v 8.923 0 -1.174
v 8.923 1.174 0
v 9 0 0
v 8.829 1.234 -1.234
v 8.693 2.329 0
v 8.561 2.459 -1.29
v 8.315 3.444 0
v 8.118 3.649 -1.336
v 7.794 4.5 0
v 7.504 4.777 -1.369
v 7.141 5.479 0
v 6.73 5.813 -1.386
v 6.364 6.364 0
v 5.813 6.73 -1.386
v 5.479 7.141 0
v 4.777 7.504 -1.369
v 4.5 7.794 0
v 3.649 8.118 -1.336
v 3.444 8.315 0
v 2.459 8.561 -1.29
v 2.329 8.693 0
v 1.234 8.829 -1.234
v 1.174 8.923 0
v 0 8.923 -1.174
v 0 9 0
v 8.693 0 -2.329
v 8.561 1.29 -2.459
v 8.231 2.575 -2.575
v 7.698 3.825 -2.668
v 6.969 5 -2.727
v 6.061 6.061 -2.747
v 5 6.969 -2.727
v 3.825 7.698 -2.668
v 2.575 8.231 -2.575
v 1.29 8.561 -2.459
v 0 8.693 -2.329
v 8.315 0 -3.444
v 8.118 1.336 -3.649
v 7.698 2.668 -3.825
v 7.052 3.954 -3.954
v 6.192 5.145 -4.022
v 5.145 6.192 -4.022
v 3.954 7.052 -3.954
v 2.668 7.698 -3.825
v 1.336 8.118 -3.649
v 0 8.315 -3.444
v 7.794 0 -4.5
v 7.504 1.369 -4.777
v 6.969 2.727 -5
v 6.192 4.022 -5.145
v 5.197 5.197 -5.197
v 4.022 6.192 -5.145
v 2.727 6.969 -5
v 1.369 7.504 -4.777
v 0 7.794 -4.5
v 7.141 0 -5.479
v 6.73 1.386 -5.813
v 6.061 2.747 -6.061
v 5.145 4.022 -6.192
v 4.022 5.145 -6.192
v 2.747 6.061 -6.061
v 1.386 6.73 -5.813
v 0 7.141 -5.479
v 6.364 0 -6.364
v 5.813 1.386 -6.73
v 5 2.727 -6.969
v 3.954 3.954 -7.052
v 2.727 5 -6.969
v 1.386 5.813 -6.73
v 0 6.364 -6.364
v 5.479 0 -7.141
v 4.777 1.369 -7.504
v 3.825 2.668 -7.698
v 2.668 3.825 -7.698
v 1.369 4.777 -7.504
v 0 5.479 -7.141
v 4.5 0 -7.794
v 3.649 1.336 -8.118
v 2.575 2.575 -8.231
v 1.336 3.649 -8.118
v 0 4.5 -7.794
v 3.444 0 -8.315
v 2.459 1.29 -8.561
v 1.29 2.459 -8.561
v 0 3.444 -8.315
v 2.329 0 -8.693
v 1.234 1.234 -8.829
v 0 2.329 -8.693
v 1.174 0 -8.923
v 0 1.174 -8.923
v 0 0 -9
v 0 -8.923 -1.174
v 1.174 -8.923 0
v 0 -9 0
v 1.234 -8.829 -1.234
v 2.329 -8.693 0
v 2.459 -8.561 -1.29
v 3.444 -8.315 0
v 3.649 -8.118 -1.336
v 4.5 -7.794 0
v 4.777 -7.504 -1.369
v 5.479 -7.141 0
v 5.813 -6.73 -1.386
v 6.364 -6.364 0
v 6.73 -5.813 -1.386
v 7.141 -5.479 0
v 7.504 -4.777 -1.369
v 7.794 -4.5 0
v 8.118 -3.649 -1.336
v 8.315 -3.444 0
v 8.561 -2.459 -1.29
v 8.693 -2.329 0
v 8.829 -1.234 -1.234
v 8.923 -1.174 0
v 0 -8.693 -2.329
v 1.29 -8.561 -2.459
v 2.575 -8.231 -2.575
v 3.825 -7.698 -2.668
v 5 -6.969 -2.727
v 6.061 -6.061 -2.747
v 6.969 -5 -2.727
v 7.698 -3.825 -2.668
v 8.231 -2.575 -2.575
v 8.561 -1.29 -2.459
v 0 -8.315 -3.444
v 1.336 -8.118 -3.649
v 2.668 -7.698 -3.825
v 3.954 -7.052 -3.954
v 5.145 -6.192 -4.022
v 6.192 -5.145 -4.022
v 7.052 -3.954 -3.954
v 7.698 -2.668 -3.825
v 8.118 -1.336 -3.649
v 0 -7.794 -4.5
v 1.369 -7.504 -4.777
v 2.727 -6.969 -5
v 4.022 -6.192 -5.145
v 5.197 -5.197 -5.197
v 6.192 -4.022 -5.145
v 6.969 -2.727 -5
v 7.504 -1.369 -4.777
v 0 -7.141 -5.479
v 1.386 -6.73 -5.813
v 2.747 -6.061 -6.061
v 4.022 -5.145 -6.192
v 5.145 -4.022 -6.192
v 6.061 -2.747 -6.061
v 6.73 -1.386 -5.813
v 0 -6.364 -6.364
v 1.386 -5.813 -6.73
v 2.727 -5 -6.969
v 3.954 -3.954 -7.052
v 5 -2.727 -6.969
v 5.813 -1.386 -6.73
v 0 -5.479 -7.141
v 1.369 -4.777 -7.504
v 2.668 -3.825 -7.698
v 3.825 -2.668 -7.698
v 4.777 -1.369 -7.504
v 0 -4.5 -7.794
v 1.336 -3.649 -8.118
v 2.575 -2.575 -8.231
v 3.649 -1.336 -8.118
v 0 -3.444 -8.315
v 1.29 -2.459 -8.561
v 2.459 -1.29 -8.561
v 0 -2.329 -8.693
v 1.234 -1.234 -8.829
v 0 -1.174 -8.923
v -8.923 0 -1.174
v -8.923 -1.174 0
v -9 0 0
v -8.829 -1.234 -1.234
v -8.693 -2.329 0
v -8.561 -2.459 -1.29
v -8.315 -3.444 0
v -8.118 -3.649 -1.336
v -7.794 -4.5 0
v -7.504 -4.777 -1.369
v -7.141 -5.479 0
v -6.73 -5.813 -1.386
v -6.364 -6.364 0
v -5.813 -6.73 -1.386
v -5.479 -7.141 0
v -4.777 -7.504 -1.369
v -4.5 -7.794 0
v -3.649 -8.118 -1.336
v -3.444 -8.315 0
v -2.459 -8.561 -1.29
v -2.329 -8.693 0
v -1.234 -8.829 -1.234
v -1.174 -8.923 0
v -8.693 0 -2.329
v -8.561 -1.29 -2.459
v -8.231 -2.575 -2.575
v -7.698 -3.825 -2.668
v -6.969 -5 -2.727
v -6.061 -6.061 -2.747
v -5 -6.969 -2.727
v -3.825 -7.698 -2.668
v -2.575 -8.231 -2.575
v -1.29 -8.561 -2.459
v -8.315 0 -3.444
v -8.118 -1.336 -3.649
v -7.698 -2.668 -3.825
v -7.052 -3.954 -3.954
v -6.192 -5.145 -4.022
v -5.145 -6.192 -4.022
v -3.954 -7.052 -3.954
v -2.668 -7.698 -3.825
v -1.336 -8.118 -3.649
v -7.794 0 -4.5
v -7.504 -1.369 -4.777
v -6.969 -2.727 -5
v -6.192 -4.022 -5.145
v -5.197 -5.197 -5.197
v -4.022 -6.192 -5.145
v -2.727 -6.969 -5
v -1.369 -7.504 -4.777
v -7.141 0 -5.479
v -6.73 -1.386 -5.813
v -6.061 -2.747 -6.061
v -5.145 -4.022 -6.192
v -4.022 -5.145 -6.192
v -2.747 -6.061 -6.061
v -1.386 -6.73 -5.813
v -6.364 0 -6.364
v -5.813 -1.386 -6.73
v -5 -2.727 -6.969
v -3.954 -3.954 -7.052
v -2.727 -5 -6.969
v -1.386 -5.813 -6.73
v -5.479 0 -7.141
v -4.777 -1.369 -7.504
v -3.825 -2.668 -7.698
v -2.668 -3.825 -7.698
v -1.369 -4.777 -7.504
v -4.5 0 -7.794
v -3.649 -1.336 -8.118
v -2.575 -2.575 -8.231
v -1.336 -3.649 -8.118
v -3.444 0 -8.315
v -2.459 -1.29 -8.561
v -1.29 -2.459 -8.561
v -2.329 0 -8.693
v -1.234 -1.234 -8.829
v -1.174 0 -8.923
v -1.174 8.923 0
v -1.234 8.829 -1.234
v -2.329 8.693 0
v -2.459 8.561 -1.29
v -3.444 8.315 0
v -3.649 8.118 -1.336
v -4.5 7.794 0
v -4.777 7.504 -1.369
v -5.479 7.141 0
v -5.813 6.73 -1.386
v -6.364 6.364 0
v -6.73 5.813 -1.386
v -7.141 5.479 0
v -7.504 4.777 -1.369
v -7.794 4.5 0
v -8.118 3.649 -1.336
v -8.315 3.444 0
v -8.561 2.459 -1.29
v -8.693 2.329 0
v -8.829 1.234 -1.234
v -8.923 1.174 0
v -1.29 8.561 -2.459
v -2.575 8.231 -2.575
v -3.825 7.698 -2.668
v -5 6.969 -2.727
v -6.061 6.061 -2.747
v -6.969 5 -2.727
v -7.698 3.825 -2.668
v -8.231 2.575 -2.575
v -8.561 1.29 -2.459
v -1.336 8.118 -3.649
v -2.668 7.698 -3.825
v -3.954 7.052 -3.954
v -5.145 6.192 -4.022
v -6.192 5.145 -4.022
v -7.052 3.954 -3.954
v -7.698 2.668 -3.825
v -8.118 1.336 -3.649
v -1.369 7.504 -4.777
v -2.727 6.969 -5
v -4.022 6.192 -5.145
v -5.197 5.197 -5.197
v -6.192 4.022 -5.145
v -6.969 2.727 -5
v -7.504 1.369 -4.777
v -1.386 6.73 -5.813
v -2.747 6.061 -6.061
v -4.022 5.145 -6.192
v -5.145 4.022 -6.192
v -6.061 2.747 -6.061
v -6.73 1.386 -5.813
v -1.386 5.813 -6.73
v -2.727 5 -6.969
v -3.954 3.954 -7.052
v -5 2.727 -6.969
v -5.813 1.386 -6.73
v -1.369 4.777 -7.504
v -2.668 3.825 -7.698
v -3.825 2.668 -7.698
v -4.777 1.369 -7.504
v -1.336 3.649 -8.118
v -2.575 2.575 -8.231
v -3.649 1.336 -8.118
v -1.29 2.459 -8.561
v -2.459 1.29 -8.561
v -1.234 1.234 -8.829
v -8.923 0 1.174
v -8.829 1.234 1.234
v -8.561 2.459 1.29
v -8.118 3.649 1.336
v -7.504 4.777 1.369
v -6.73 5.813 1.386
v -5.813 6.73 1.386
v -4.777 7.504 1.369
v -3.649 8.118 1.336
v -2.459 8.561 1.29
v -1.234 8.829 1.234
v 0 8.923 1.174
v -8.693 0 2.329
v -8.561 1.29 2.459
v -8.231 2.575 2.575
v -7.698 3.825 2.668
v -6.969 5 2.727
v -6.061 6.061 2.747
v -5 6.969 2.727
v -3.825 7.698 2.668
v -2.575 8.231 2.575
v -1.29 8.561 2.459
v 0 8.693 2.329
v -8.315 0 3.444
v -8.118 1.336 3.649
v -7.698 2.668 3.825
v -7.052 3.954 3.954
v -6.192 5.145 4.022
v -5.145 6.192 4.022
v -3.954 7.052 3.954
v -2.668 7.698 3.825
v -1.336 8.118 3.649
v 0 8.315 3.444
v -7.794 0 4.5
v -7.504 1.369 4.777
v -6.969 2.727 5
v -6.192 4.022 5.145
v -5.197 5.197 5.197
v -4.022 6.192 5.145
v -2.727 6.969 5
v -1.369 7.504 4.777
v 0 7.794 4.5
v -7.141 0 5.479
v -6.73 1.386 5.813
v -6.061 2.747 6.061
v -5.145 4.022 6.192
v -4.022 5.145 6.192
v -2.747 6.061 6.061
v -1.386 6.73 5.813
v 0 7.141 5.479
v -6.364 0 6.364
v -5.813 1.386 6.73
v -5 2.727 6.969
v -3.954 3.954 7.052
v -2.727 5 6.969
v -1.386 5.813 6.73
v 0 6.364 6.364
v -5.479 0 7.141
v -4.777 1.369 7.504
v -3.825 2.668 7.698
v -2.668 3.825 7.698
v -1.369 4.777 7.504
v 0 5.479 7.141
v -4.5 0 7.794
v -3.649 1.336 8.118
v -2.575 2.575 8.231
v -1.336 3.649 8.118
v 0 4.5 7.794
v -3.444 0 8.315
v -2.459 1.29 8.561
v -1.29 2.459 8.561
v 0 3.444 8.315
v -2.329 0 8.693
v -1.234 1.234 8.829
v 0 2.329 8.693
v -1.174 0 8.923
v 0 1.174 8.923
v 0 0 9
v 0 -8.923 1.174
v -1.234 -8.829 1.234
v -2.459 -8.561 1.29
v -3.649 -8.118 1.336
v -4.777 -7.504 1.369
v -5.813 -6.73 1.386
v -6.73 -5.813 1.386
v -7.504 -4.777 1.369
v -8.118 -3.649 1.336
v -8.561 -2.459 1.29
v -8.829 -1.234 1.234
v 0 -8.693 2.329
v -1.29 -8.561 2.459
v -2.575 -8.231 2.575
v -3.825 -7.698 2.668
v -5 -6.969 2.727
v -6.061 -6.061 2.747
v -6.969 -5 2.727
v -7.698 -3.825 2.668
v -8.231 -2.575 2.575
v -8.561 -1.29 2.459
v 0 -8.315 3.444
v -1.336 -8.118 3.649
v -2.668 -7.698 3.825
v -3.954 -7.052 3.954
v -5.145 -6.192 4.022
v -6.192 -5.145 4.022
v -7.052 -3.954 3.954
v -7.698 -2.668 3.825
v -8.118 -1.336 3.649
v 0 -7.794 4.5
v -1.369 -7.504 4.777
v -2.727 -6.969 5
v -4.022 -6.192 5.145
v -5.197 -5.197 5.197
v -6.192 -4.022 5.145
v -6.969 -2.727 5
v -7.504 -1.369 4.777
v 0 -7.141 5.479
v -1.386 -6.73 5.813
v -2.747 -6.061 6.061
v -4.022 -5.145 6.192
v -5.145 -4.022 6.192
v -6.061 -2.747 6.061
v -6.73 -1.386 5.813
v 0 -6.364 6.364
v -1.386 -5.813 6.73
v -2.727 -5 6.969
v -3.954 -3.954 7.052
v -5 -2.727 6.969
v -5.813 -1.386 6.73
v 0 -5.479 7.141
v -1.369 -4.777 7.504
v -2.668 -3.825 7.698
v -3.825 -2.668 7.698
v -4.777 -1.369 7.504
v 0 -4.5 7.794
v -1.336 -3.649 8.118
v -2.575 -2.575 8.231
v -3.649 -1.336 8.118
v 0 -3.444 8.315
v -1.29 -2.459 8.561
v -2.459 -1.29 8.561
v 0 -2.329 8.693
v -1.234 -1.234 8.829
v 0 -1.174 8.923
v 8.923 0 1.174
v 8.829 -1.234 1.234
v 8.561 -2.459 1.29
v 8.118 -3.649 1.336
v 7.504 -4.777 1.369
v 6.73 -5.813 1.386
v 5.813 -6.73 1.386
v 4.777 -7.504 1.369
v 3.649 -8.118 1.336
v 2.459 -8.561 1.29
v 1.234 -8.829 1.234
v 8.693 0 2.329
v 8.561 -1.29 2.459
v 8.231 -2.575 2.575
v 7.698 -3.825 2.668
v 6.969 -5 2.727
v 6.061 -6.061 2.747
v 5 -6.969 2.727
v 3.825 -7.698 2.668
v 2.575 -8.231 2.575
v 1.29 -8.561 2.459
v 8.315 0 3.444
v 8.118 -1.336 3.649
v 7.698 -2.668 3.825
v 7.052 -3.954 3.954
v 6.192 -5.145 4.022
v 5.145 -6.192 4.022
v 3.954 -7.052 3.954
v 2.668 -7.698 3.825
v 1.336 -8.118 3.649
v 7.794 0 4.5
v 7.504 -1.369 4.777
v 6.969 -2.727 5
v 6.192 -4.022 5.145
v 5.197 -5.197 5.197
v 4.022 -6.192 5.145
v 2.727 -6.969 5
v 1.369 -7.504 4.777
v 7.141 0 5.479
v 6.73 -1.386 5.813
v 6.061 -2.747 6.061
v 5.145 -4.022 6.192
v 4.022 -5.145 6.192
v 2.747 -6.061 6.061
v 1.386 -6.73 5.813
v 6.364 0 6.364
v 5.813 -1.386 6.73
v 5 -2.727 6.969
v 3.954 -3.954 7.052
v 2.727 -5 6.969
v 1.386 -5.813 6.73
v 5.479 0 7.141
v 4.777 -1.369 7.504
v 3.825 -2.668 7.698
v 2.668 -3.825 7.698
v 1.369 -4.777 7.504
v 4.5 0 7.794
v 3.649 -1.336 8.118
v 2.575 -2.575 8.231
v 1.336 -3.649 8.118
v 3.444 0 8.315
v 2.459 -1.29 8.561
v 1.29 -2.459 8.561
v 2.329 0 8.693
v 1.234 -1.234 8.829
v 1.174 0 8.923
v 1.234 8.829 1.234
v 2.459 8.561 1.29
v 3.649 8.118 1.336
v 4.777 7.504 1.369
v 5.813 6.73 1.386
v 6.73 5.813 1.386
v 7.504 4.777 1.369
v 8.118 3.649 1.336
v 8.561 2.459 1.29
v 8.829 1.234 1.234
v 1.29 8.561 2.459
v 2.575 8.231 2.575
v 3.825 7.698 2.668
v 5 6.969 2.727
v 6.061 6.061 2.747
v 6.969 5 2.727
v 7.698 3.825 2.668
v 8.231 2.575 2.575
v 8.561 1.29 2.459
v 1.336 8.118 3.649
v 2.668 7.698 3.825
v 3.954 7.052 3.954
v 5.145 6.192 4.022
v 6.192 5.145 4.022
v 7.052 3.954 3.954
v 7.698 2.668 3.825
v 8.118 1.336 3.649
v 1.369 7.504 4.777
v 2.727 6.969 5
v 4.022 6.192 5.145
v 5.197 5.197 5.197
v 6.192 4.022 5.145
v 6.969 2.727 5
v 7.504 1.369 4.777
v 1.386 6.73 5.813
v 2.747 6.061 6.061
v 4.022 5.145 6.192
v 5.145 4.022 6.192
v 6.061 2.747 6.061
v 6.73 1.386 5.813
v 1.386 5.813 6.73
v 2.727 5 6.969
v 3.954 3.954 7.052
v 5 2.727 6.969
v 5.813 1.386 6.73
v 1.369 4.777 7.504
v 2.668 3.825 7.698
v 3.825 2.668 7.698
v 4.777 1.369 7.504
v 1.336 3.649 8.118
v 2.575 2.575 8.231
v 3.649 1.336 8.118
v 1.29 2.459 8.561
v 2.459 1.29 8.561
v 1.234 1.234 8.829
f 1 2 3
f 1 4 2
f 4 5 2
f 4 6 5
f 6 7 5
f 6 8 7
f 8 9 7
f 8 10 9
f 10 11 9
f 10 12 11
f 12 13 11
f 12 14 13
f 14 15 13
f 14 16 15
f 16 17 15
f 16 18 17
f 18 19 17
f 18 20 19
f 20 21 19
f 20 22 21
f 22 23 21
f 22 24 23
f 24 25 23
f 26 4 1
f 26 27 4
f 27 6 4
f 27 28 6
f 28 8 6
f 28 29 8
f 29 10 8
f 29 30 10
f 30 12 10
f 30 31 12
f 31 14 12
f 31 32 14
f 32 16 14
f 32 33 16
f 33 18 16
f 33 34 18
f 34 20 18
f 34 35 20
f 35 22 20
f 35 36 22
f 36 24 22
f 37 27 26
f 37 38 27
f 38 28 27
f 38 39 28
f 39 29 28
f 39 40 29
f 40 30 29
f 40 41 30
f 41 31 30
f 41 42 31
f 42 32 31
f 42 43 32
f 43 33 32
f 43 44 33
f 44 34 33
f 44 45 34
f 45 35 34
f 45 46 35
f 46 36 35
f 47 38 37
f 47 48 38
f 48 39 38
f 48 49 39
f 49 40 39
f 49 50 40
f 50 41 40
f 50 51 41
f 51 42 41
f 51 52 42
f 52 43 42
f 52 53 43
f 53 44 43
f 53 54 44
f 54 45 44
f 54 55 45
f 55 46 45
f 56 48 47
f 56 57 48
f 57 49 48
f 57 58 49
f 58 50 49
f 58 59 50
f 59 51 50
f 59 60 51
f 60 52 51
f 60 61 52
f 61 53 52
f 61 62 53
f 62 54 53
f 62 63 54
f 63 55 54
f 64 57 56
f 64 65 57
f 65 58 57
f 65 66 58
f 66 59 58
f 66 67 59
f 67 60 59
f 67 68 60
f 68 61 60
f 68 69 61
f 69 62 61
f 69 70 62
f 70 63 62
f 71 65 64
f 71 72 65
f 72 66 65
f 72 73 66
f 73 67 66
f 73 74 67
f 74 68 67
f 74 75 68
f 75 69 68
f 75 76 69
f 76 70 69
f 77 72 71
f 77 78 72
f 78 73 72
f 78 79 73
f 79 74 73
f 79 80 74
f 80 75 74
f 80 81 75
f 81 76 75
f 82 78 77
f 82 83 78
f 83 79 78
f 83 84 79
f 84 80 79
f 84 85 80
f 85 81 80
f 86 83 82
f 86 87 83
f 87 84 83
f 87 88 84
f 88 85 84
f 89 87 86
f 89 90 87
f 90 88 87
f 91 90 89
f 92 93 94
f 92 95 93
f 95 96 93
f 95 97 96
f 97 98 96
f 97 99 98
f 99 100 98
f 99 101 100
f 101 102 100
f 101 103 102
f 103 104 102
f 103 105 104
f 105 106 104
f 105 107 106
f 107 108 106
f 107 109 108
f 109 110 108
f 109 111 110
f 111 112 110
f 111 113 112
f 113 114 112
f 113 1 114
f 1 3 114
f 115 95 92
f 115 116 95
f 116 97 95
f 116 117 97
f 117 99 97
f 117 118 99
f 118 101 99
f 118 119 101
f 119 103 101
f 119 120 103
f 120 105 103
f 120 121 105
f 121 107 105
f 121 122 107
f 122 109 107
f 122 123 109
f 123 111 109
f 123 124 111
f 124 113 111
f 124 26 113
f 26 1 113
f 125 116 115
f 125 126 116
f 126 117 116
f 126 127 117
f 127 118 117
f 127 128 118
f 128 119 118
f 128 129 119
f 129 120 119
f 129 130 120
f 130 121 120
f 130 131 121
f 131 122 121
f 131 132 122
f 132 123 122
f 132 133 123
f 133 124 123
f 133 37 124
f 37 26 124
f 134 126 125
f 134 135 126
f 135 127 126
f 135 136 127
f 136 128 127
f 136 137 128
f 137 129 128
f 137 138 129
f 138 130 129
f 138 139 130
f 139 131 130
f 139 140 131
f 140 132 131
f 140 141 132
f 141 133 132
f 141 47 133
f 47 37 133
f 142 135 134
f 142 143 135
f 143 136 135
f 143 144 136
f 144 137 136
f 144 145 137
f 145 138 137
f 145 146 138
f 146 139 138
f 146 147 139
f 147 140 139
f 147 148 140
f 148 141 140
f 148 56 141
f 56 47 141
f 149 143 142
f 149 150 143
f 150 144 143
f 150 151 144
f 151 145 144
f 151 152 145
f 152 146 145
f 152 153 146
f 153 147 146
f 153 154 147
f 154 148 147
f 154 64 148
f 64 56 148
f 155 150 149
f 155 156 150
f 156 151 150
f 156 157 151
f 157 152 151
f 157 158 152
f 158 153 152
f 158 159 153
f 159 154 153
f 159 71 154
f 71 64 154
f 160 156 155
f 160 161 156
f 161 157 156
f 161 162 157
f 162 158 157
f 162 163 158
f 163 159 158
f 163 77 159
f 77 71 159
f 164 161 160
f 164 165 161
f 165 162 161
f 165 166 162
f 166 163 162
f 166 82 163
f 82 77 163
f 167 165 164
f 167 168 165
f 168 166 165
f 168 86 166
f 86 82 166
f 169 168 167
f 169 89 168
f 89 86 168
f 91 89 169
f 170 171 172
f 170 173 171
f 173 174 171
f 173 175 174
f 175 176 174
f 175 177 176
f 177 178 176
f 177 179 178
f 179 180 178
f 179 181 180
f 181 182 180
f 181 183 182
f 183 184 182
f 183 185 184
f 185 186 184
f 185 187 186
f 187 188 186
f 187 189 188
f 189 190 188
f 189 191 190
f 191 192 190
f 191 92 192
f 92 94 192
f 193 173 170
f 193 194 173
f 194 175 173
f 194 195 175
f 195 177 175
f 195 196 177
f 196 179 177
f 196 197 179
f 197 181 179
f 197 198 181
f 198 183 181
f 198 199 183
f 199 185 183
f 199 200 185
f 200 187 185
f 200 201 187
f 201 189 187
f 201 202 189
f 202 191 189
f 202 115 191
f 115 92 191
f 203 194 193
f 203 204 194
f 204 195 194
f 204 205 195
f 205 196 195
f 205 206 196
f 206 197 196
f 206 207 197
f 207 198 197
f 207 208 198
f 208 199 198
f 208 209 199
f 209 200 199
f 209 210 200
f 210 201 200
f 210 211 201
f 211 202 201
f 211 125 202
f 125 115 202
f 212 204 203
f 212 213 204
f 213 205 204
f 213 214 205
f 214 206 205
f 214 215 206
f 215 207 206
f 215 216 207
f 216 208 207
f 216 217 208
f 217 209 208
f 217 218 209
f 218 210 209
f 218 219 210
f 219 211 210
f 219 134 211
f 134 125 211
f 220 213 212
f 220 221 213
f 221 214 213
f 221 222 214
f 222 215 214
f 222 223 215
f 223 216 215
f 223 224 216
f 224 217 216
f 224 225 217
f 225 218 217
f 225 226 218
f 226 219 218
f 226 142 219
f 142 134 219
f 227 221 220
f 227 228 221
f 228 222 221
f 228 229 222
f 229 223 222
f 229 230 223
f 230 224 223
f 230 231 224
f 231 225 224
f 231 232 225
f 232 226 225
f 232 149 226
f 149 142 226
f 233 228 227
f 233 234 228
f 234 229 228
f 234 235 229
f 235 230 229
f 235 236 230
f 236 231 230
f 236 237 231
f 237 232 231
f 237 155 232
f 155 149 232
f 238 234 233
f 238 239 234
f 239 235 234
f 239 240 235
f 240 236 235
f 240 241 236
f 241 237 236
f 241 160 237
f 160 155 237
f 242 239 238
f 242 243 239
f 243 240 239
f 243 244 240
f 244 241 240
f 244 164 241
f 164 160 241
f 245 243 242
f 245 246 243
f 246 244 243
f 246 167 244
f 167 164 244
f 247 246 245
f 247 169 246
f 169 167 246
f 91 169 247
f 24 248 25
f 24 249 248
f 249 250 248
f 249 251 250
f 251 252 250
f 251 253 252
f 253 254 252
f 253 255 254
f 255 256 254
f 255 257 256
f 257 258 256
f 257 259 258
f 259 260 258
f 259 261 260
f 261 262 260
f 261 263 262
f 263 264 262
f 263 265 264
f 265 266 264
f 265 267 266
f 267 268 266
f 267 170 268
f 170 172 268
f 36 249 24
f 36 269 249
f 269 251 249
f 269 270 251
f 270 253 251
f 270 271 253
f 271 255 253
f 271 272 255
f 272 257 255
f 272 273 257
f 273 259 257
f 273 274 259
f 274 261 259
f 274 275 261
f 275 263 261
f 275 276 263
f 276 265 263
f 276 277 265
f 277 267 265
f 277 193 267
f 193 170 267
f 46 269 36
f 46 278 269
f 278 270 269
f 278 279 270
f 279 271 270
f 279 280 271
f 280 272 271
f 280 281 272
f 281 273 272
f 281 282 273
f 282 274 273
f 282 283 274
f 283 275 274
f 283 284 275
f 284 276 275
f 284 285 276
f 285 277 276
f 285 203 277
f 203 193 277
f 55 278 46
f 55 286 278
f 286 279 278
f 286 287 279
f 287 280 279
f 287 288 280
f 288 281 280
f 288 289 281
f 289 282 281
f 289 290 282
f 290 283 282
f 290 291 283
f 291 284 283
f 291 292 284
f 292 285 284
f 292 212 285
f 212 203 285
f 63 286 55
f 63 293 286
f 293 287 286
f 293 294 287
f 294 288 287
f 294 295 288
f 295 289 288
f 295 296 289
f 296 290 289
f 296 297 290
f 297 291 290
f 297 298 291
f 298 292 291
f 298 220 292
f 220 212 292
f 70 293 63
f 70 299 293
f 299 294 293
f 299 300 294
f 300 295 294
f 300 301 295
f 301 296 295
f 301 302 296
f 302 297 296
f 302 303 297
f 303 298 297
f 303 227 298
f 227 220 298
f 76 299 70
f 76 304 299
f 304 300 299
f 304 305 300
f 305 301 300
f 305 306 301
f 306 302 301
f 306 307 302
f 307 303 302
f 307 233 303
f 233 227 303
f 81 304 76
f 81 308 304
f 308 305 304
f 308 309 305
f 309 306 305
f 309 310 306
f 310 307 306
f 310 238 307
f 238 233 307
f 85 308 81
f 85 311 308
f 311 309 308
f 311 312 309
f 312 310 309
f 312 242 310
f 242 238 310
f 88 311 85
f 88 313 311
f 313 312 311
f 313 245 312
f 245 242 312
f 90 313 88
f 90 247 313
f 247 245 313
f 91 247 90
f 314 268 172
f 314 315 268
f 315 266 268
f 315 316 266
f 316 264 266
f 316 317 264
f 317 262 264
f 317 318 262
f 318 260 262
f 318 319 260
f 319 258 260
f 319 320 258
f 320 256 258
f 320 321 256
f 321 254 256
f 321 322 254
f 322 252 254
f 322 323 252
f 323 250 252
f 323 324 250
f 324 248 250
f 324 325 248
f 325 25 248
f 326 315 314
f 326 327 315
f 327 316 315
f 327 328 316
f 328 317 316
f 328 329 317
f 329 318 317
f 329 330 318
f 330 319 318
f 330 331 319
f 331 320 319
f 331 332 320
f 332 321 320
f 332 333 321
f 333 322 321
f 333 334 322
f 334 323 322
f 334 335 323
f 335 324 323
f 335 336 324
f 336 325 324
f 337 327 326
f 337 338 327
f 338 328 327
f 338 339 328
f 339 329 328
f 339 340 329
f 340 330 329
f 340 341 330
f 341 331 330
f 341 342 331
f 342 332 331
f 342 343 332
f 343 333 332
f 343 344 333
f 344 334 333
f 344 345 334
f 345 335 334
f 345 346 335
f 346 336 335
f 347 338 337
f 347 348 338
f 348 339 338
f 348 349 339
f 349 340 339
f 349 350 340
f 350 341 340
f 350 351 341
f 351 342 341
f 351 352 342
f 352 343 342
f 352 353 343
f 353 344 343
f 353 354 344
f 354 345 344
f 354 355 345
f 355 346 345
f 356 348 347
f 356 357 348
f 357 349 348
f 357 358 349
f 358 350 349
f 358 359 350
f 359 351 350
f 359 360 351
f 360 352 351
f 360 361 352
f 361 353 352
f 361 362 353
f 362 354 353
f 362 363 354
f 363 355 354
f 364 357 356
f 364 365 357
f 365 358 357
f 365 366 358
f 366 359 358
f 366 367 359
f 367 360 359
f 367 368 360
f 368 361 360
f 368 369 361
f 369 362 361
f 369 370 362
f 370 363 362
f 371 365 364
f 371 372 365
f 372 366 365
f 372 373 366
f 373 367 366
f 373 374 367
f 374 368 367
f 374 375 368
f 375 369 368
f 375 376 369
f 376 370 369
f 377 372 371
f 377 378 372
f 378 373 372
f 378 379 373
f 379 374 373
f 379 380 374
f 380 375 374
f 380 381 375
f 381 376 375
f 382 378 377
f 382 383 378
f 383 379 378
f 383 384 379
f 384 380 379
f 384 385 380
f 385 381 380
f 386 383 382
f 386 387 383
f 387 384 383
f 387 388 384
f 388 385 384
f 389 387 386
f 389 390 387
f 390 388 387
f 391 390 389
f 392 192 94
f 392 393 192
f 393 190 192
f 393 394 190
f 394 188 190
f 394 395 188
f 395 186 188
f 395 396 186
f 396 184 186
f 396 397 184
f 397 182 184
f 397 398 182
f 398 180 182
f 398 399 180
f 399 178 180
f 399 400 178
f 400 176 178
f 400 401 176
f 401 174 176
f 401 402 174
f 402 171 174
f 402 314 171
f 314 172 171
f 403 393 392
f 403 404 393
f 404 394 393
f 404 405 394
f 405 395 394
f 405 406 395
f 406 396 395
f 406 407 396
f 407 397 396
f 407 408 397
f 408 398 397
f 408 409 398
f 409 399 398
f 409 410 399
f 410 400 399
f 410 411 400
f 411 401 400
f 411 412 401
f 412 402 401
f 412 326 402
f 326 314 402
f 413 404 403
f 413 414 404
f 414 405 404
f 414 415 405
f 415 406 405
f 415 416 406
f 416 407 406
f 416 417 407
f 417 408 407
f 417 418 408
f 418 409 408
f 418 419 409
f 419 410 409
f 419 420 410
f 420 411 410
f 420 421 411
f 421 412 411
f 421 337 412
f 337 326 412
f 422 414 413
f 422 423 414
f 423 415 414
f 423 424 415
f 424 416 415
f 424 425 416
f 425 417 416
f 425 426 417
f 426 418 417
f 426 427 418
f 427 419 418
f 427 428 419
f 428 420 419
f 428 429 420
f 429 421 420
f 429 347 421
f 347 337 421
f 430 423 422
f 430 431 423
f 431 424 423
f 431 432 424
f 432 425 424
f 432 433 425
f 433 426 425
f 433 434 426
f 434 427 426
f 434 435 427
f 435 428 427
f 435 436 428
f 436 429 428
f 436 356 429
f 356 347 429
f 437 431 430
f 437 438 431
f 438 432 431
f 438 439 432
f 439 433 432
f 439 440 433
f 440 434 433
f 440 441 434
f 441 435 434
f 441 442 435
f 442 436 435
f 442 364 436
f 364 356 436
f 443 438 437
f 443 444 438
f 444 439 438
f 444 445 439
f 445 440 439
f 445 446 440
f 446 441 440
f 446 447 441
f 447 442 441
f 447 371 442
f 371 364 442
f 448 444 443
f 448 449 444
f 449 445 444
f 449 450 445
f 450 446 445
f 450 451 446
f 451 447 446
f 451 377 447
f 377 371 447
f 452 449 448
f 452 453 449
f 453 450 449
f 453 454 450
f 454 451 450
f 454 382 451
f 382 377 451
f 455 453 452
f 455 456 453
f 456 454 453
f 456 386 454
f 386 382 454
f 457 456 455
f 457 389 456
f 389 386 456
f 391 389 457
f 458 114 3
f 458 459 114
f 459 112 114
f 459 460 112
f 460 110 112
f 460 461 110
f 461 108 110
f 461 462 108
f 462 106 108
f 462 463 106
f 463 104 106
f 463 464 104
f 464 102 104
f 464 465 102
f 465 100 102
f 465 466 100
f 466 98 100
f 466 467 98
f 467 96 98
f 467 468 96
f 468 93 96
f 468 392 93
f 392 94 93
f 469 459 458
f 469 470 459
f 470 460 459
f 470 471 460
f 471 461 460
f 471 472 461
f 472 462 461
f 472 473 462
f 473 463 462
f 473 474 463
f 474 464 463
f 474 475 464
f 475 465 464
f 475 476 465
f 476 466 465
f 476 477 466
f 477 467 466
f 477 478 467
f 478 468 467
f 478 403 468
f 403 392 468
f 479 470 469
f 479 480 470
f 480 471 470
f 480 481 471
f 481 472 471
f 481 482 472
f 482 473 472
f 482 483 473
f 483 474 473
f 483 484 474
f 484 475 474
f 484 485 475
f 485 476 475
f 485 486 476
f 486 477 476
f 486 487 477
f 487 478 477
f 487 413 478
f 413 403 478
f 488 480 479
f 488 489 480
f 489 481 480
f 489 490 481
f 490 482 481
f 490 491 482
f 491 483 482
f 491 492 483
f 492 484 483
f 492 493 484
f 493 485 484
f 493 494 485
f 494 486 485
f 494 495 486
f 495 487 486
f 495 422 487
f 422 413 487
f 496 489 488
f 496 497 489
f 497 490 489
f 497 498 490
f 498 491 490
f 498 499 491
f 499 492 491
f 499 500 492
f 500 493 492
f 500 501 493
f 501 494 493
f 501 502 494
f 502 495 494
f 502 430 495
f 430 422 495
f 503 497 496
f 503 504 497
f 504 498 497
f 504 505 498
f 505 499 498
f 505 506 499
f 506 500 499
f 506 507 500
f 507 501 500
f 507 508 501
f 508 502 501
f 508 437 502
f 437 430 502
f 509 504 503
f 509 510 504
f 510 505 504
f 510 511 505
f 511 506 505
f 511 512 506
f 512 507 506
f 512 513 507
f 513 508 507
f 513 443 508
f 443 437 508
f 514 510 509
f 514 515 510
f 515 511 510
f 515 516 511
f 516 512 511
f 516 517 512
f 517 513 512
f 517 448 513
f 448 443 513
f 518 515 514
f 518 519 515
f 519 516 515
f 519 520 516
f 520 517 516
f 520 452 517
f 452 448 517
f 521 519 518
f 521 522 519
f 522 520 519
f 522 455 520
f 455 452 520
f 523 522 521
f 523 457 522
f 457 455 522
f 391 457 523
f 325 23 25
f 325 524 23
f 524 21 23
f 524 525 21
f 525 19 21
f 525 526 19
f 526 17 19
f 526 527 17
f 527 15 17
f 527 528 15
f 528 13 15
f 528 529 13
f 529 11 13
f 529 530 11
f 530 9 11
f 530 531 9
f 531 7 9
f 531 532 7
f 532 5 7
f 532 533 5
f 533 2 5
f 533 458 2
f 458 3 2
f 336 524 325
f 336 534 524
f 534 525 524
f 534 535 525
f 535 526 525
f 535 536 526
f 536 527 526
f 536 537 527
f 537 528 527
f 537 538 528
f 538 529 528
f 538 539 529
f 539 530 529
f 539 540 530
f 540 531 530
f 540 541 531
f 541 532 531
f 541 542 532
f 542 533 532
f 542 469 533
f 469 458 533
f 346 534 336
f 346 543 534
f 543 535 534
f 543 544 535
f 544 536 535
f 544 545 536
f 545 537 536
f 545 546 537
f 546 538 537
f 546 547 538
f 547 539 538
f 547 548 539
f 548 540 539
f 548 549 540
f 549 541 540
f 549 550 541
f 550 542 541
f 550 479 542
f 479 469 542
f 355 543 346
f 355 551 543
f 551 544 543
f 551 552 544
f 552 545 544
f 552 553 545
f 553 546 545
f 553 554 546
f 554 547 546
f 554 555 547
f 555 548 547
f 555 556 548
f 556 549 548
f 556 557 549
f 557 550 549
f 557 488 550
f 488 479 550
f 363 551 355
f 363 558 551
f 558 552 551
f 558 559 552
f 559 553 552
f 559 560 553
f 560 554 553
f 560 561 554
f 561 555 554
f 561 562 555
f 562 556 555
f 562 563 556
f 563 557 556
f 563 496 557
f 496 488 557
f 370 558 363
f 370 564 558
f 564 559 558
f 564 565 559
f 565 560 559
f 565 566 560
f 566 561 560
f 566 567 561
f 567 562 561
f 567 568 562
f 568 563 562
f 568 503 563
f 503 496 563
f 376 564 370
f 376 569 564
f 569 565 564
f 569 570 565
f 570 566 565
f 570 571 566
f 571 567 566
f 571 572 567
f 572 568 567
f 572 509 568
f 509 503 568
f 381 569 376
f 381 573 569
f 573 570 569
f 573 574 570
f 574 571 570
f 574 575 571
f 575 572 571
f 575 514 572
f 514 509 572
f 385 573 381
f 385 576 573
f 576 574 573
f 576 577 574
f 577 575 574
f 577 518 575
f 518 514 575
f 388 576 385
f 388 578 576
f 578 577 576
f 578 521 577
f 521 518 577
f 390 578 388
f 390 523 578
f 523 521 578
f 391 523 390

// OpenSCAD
// file: ../p/48/8-8sphe.scad
use <../../lib.scad>
use <1-8sphe.scad>
function ldraw_lib__48__8_8sphe() = [
// 0 Hi-Res Sphere 1.0
// 0 Name: 48\8-8sphe.dat
// 0 Author: Steve Bliss [sbliss]
// 0 !LDRAW_ORG 48_Primitive UPDATE 2012-01
// 0 !LICENSE Licensed under CC BY 2.0 and CC BY 4.0 : see CAreadme.txt
// 
// 0 BFC CERTIFY CCW
  [0,"BFC","CERTIFY"],
  [0,"BFC","CCW"],
// 
// 0 !HISTORY 2012-03-30 [PTadmin] Official Update 2012-01
// 
// 
// 1 16 0 0 0 1 0 0 0 1 0 0 0 1 48\1-8sphe.dat
  [1,16,0,0,0,1,0,0,0,1,0,0,0,1, ldraw_lib__48__1_8sphe()],
// 1 16 0 0 0 0 0 1 0 1 0 -1 0 0 48\1-8sphe.dat
  [1,16,0,0,0,0,0,1,0,1,0,-1,0,0, ldraw_lib__48__1_8sphe()],
// 1 16 0 0 0 -1 0 0 0 1 0 0 0 -1 48\1-8sphe.dat
  [1,16,0,0,0,-1,0,0,0,1,0,0,0,-1, ldraw_lib__48__1_8sphe()],
// 1 16 0 0 0 0 0 -1 0 1 0 1 0 0 48\1-8sphe.dat
  [1,16,0,0,0,0,0,-1,0,1,0,1,0,0, ldraw_lib__48__1_8sphe()],
// 1 16 0 0 0 -1 0 0 0 -1 0 0 0 1 48\1-8sphe.dat
  [1,16,0,0,0,-1,0,0,0,-1,0,0,0,1, ldraw_lib__48__1_8sphe()],
// 1 16 0 0 0 0 0 -1 0 -1 0 -1 0 0 48\1-8sphe.dat
  [1,16,0,0,0,0,0,-1,0,-1,0,-1,0,0, ldraw_lib__48__1_8sphe()],
// 1 16 0 0 0 1 0 0 0 -1 0 0 0 -1 48\1-8sphe.dat
  [1,16,0,0,0,1,0,0,0,-1,0,0,0,-1, ldraw_lib__48__1_8sphe()],
// 1 16 0 0 0 0 0 1 0 -1 0 1 0 0 48\1-8sphe.dat
  [1,16,0,0,0,0,0,1,0,-1,0,1,0,0, ldraw_lib__48__1_8sphe()],
// 0
];
module ldraw_lib__48__8_8sphe(step=0, col=false, unit=2/5, alt=false, line=0.2, solid=!$preview)
    makepoly(ldraw_lib__48__8_8sphe(), step=step, col=col, unit=unit, alt=alt, line=line, solid=solid);
ldraw_lib__48__8_8sphe(line=0.2);
// main file
use <../lib.scad>
use <../p/48/8-8sphe.scad>
function ldraw_lib__99948() = [
// 0 Technic Steel Ball 18mm for Ball Castor
// 0 Name: 99948.dat
// 0 Author: Philippe Hurbain [Philo]
// 0 !LDRAW_ORG Part UPDATE 2013-02
// 0 !LICENSE Licensed under CC BY 2.0 and CC BY 4.0 : see CAreadme.txt
// 
// 0 BFC CERTIFY CCW
  [0,"BFC","CERTIFY"],
  [0,"BFC","CCW"],
// 
// 0 !HISTORY 2013-12-23 [PTadmin] Official Update 2013-02
// 
// 
// 1 16 0 0 0 22.5 0 0 0 22.5 0 0 0 22.5 48\8-8sphe.dat
  [1,16,0,0,0,22.5,0,0,0,22.5,0,0,0,22.5, ldraw_lib__48__8_8sphe()],
];
module ldraw_lib__99948(step=0, col=false, unit=2/5, alt=false, line=0.2, solid=!$preview)
    makepoly(ldraw_lib__99948(), step=step, col=col, unit=unit, alt=alt, line=line, solid=solid);
ldraw_lib__99948(line=0.2);
